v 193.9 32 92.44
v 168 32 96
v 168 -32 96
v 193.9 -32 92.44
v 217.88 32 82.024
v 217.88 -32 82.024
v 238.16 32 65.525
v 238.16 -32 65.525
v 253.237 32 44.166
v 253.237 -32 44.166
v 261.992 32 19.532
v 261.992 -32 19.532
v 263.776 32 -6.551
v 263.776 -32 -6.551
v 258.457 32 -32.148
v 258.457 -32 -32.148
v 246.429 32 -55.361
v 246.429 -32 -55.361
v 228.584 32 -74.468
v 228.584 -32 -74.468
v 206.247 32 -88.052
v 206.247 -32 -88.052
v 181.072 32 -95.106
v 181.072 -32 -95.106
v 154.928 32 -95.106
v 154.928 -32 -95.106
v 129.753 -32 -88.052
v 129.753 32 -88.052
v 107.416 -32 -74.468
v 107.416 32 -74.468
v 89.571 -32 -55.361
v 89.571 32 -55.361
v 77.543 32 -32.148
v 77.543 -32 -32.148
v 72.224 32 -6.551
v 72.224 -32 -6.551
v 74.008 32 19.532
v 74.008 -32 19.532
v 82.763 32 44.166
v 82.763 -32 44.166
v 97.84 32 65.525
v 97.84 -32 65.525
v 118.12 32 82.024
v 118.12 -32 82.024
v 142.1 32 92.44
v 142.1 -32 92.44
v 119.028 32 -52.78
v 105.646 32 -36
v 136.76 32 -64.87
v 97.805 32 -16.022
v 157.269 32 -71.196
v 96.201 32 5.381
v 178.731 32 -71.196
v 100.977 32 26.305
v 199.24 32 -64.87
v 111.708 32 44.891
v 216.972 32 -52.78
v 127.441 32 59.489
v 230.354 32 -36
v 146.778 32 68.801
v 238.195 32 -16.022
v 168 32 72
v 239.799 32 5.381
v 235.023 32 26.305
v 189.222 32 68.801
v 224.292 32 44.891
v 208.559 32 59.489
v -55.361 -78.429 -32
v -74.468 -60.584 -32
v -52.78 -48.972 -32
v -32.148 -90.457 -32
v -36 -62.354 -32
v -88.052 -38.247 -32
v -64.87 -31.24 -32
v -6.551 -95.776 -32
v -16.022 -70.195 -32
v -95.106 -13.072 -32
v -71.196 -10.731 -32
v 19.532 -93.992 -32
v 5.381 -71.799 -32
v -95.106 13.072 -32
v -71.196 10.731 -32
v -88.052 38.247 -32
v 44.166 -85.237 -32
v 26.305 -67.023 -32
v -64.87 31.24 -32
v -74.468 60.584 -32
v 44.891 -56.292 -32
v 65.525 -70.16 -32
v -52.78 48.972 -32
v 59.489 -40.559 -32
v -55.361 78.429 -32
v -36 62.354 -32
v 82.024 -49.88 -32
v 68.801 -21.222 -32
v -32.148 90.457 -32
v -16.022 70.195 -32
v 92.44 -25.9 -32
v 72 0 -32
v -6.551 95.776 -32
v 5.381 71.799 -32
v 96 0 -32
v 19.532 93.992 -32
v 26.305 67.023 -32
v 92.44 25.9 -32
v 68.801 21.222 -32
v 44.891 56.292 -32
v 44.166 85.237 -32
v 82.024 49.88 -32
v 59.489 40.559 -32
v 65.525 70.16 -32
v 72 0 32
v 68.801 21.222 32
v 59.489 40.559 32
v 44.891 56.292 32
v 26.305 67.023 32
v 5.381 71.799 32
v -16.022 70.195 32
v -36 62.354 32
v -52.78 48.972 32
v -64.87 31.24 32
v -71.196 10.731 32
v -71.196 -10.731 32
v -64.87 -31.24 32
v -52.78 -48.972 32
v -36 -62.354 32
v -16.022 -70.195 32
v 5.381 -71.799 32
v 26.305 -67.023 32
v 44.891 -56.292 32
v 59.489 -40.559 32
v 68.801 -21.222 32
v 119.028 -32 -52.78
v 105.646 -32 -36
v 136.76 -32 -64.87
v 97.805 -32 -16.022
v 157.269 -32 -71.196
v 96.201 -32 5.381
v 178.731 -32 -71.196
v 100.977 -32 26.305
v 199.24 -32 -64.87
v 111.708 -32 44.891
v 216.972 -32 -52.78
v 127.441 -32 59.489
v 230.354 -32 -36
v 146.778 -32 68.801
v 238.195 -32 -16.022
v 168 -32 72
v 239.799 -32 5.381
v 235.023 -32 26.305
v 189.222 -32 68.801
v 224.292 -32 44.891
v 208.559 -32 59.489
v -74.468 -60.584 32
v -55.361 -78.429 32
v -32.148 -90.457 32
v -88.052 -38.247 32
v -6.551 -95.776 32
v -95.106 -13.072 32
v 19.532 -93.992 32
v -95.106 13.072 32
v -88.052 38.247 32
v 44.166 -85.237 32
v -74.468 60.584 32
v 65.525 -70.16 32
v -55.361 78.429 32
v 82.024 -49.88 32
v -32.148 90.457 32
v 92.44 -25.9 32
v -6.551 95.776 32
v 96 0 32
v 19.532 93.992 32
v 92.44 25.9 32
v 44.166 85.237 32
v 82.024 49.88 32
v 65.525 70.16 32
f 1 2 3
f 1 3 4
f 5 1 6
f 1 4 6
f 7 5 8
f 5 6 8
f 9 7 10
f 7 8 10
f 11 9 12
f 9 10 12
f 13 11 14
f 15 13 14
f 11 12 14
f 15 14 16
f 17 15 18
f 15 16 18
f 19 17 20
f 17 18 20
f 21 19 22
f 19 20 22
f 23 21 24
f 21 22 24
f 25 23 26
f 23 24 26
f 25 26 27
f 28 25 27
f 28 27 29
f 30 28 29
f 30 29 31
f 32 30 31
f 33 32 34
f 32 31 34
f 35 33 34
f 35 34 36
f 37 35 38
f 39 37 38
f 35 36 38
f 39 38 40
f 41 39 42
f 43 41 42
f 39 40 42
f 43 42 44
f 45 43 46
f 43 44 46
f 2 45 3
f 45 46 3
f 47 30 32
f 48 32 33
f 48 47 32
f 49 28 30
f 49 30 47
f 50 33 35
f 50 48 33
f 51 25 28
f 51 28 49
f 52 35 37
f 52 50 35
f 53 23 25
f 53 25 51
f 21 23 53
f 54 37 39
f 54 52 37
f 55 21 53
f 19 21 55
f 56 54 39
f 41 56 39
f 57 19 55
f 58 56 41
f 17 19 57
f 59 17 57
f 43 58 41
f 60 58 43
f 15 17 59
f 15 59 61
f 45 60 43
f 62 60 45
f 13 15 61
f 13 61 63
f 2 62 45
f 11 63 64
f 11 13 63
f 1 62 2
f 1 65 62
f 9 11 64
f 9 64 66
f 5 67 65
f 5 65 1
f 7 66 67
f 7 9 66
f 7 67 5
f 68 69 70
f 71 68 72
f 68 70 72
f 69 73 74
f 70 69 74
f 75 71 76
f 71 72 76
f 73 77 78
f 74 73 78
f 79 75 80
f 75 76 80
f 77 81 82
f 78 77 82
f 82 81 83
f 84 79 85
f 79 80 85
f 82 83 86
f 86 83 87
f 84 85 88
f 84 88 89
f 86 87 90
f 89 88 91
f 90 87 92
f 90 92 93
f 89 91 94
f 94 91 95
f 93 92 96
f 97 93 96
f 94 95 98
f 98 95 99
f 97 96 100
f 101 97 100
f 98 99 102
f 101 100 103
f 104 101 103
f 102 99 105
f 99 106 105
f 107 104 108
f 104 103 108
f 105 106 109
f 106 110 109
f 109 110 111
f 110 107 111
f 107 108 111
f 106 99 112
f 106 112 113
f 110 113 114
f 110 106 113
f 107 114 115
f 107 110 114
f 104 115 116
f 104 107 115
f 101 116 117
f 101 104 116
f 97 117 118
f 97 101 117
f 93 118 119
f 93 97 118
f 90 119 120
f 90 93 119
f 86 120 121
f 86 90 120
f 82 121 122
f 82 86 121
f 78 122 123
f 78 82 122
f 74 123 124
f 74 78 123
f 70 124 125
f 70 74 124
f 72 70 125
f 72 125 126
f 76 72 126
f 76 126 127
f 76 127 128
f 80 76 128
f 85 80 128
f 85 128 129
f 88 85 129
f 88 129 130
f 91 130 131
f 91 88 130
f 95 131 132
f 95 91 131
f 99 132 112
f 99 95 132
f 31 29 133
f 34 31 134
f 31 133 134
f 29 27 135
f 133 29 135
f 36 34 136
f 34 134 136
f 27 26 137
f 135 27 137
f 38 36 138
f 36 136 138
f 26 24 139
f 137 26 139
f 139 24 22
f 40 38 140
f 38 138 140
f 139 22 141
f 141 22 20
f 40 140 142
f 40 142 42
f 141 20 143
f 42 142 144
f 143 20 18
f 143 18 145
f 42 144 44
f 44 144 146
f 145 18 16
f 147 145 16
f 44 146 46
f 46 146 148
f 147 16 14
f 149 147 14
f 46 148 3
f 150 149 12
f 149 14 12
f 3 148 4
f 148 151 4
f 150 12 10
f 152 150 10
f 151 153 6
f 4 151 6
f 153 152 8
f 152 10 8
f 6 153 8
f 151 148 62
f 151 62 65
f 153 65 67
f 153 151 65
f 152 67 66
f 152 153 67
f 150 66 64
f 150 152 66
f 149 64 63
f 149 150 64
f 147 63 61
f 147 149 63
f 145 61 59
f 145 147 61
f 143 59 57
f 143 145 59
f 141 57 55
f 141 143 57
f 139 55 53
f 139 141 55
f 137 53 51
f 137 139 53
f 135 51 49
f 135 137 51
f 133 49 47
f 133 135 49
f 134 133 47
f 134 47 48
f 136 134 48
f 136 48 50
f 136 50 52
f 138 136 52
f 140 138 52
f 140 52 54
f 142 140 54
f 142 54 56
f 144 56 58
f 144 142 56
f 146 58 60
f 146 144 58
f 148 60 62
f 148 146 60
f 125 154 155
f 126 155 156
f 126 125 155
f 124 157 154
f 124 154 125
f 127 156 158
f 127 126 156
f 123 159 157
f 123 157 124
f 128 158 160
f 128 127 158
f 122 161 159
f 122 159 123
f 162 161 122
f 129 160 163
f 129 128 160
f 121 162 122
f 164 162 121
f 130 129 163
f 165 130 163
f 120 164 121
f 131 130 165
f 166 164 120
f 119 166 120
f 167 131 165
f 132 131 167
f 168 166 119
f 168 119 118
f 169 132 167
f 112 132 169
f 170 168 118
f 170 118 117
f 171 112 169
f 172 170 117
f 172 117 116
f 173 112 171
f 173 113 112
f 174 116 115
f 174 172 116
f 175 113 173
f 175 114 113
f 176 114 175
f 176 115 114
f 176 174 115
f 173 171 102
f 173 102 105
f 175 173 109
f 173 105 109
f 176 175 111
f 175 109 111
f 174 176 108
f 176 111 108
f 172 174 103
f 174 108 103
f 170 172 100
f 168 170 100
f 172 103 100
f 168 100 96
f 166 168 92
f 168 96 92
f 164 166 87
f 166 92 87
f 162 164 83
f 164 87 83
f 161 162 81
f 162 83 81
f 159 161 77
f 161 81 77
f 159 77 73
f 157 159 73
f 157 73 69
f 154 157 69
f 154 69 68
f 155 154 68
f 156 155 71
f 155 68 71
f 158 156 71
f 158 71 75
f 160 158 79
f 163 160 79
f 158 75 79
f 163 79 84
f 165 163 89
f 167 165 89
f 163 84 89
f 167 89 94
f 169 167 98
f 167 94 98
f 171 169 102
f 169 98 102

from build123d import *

# Parameters (mm, degrees)
BOSS_EXTRUDE1_DEPTH      = 32
BOSS_EXTRUDE1_DEPTH_BACK = 32
SKETCH1_R                = 96
SKETCH1_R_2              = 72
BOSS_EXTRUDE2_DEPTH      = 32
BOSS_EXTRUDE2_DEPTH_BACK = 32
SKETCH2_R                = 96
SKETCH2_R_2              = 72


with BuildPart() as part:
    # Sketch1 → Boss-Extrude1 (new, two sides: drawn at the far end of the back side and taken through both)
    with BuildSketch(Plane.XY.offset(-BOSS_EXTRUDE1_DEPTH_BACK)):
        Circle(SKETCH1_R)
        Circle(SKETCH1_R_2, mode=Mode.SUBTRACT)
    extrude(amount=BOSS_EXTRUDE1_DEPTH + BOSS_EXTRUDE1_DEPTH_BACK)


with BuildPart() as body_2:
    # Sketch2 → Boss-Extrude2 (new, two sides: drawn at the far end of the back side and taken through both)
    with BuildSketch(Plane(origin=(0, 0, 0), x_dir=(1, 0, 0), z_dir=(0, 1, 0)).offset(-BOSS_EXTRUDE2_DEPTH_BACK)):
        with Locations((168, 0)):
            Circle(SKETCH2_R)
        with Locations((168, 0)):
            Circle(SKETCH2_R_2, mode=Mode.SUBTRACT)
    extrude(amount=BOSS_EXTRUDE2_DEPTH + BOSS_EXTRUDE2_DEPTH_BACK)


solid = Compound([part.part, body_2.part])
